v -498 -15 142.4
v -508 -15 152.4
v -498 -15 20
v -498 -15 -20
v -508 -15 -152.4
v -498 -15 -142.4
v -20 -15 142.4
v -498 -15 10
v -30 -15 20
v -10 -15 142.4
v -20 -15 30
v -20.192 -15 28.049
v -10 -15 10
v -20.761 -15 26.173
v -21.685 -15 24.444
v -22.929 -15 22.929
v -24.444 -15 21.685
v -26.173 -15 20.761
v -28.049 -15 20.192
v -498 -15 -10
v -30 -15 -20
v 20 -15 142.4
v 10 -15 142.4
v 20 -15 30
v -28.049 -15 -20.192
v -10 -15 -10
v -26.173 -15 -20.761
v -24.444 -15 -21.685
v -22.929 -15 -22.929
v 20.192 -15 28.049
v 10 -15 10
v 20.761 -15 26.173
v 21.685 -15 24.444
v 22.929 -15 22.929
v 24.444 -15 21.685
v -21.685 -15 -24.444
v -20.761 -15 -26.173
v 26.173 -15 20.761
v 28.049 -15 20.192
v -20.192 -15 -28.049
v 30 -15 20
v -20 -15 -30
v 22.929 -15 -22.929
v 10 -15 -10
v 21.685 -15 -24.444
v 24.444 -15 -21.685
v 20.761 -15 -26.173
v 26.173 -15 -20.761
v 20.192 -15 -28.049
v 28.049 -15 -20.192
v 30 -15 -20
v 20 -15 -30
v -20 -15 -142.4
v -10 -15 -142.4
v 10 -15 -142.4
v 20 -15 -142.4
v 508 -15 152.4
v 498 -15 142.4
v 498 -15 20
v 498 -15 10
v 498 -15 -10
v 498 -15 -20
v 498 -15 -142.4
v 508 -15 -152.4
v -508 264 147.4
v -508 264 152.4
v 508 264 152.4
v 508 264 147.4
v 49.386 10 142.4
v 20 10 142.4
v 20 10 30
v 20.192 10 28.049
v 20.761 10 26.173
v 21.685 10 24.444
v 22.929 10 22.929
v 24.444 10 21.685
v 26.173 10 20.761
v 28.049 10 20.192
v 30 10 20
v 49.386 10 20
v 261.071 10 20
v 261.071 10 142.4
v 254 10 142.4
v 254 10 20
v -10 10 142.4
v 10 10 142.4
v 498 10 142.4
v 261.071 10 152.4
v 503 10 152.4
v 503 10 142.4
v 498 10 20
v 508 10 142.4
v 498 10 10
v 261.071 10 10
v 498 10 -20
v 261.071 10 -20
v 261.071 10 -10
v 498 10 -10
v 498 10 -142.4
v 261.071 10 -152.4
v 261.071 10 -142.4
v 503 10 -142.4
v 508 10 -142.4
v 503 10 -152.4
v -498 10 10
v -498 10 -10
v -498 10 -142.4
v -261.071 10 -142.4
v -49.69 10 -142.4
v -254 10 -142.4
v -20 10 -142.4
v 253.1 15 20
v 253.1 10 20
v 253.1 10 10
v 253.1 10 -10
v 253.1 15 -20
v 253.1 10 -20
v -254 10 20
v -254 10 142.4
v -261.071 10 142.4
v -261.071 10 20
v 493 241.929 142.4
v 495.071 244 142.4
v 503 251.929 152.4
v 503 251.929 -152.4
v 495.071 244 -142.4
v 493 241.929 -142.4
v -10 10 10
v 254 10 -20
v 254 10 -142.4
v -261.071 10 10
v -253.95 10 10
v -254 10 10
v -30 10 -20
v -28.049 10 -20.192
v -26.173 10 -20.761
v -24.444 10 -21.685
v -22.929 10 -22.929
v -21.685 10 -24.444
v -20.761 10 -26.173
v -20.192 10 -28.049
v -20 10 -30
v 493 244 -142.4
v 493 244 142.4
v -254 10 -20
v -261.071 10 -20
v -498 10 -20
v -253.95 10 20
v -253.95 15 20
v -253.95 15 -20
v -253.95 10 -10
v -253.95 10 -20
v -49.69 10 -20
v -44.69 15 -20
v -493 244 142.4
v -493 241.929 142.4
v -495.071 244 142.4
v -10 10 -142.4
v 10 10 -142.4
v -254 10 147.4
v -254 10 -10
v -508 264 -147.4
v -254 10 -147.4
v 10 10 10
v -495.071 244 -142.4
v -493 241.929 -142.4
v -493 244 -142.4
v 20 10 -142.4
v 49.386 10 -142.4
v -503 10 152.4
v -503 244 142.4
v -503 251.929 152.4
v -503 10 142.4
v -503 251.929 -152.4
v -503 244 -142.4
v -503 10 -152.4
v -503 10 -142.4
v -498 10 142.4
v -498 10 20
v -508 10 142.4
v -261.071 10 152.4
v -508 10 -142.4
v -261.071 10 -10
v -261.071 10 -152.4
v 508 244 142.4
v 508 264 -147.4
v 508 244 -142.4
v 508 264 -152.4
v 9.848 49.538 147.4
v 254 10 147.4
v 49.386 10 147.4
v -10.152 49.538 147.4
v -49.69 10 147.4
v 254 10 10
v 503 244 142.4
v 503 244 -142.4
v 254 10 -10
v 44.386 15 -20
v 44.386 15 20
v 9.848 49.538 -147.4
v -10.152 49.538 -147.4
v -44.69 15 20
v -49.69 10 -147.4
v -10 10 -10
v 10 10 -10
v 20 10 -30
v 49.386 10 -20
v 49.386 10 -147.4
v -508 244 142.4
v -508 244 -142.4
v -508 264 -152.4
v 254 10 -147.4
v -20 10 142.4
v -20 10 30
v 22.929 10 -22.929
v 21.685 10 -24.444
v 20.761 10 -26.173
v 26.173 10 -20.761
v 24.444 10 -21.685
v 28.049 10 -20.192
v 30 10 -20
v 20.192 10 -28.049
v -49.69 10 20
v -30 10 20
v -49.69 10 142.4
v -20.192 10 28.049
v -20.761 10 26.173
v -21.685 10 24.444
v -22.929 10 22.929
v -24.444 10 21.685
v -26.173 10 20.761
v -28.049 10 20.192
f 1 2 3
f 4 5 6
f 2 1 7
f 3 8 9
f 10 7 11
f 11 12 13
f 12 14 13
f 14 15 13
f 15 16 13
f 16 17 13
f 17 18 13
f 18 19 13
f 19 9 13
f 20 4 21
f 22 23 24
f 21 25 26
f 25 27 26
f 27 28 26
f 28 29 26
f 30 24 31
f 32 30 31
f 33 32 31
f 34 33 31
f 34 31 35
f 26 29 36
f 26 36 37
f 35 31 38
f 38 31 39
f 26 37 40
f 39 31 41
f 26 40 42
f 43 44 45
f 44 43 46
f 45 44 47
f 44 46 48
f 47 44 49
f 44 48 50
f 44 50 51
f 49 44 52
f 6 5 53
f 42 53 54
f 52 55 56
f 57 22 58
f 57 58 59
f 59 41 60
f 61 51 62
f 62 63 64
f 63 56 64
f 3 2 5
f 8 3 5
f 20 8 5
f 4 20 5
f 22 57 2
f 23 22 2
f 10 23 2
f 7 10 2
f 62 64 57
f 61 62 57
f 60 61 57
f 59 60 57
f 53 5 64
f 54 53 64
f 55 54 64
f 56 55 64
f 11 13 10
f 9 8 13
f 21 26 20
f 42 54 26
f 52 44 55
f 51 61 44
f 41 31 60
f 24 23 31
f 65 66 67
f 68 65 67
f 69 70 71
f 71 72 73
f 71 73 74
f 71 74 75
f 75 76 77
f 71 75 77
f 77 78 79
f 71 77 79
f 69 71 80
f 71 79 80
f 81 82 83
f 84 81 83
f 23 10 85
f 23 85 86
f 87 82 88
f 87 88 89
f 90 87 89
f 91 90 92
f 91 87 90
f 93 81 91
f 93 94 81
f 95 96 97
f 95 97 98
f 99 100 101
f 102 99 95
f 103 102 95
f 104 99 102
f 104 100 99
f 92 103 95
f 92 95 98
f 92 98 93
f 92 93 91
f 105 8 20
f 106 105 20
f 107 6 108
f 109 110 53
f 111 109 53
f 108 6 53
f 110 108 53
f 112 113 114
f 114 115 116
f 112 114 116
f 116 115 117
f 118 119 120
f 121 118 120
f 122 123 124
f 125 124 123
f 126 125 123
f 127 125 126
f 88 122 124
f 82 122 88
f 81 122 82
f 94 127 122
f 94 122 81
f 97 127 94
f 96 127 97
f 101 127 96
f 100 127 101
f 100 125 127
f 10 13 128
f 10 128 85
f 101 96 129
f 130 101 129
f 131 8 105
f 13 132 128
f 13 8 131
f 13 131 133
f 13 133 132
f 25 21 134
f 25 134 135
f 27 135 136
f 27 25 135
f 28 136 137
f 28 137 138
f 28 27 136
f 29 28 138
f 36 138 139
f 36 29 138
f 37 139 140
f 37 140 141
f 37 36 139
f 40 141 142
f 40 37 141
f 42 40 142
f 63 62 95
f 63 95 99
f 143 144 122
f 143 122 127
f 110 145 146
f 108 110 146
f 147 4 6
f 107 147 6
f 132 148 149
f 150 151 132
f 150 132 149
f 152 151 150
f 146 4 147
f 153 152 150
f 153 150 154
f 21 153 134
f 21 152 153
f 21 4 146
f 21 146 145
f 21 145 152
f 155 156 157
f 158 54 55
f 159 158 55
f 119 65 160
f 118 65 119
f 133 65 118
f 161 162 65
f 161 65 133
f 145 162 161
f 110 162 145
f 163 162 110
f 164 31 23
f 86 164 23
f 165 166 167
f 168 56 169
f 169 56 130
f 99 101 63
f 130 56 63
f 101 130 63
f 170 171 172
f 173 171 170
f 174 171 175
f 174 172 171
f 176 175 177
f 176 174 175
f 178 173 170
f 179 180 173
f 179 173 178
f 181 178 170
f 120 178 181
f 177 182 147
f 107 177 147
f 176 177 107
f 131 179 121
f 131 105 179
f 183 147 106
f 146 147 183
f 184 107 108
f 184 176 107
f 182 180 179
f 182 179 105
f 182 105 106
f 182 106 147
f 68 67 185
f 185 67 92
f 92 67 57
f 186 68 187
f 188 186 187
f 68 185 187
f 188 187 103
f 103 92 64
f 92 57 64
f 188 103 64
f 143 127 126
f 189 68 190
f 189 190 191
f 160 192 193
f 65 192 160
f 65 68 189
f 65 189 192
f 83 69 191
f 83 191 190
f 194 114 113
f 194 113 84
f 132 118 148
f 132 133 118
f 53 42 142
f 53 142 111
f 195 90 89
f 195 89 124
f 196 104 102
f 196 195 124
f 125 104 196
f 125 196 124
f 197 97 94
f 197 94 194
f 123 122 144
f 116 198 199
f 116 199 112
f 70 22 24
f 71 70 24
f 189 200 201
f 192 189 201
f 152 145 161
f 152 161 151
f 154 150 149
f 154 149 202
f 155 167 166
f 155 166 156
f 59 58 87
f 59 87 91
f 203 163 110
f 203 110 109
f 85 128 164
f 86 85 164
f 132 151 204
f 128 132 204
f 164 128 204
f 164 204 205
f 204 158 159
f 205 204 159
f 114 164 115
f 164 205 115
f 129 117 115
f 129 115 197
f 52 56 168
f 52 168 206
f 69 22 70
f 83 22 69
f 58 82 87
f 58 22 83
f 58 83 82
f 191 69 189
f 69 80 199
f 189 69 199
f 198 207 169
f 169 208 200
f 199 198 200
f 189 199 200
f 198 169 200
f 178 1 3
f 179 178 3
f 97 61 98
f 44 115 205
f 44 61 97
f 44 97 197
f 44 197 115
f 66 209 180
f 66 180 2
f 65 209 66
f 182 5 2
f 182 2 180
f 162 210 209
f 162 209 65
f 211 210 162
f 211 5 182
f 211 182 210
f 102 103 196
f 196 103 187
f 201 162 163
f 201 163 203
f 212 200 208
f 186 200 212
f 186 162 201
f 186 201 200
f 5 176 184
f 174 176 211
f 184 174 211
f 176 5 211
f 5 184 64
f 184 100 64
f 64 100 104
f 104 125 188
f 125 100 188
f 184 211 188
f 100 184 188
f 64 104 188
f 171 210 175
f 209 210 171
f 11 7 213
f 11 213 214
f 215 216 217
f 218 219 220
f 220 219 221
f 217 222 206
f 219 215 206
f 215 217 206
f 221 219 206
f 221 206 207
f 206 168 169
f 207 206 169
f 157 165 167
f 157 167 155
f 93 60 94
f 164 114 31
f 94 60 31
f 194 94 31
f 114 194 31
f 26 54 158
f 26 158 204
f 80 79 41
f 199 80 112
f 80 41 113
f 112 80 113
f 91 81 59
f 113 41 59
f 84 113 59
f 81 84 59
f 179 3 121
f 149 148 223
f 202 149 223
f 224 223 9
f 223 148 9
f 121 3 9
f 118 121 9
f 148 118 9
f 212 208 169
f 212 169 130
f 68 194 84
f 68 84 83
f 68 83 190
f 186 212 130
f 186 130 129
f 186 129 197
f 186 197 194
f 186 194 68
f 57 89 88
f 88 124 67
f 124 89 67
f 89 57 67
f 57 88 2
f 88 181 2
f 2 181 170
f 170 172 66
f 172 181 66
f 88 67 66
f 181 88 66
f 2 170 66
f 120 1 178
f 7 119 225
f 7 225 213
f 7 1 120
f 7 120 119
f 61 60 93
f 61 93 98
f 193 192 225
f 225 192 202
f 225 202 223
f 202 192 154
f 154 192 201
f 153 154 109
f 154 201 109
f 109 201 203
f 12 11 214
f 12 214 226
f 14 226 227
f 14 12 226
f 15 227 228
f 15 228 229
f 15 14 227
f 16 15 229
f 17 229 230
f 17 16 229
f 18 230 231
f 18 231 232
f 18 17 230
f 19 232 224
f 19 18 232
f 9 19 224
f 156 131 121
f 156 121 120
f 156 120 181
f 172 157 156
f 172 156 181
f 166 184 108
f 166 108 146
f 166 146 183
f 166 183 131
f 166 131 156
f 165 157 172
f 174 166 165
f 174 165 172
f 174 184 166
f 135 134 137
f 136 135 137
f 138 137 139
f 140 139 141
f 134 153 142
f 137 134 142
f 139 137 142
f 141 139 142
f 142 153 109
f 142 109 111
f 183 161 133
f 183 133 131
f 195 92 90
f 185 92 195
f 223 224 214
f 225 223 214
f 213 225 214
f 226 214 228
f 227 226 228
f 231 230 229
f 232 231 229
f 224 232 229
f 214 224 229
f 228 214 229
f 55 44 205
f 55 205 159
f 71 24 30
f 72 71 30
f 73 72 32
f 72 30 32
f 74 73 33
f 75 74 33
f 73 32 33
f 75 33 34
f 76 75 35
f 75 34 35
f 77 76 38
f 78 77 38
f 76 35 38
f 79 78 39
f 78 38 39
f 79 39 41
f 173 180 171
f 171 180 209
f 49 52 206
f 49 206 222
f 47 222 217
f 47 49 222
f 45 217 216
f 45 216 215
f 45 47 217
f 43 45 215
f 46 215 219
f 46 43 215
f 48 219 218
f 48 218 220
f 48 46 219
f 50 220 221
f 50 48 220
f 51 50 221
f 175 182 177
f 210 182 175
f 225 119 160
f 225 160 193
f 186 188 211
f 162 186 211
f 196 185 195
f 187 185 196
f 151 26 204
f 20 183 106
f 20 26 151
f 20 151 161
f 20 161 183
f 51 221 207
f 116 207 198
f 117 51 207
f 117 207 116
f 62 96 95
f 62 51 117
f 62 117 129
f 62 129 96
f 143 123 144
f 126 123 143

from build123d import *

# Parameters (mm, degrees)
BOSS_EXTRUDE1_DEPTH      = 10
BOSS_EXTRUDE1_DEPTH_BACK = 15
SKETCH1_W                = 1016
SKETCH1_H                = 304.8
SKETCH1_W_2              = 996
SKETCH1_H_2              = 284.8
BOSS_EXTRUDE2_DEPTH      = 10
BOSS_EXTRUDE2_DEPTH_BACK = 15
BOSS_EXTRUDE3_DEPTH      = 152.4
BOSS_EXTRUDE3_DEPTH_BACK = 152.4
SKETCH4_W                = 507.049279033
SKETCH4_H                = 40
BOSS_EXTRUDE7_DEPTH      = 5
SKETCH5_W                = 284.8
SKETCH5_H                = 234
CUT_EXTRUDE1_DEPTH       = 15
SKETCH6_W                = 284.8
SKETCH6_H                = 234
CUT_EXTRUDE2_DEPTH       = 15
BOSS_EXTRUDE8_DEPTH      = 304.8
BOSS_EXTRUDE9_DEPTH      = 5
BOSS_EXTRUDE10_DEPTH     = 5


with BuildPart() as part:
    # Sketch1 → Boss-Extrude1 (new, two sides: drawn at the far end of the back side and taken through both)
    with BuildSketch(Plane(origin=(0, 0, 0), x_dir=(1, 0, 0), z_dir=(0, 1, 0)).offset(-BOSS_EXTRUDE1_DEPTH_BACK)):
        Rectangle(SKETCH1_W, SKETCH1_H)
        Rectangle(SKETCH1_W_2, SKETCH1_H_2, mode=Mode.SUBTRACT)
    extrude(amount=BOSS_EXTRUDE1_DEPTH + BOSS_EXTRUDE1_DEPTH_BACK)

    # Sketch2 → Boss-Extrude2 (add, two sides: drawn at the far end of the back side and taken through both)
    with BuildSketch(Plane(origin=(0, 0, 0), x_dir=(1, 0, 0), z_dir=(0, 1, 0)).offset(-BOSS_EXTRUDE2_DEPTH_BACK)):
        with BuildLine():
            Line((-498, 20), (-30, 20))
            ThreePointArc((-30, 20), (-22.928932188, 22.928932188), (-20, 30))
            Line((-20, 30), (-20, 142.4))
            Line((-20, 142.4), (-10, 142.4))
            Line((-10, 142.4), (-10, 20))
            Line((-10, 20), (-10, 10))
            Line((-10, 10), (-498, 10))
            Line((-498, 10), (-498, 20))
        make_face()
        with BuildLine():
            Line((498, 20), (498, 10))
            Line((498, 10), (10, 10))
            Line((10, 10), (10, 20))
            Line((10, 20), (10, 142.4))
            Line((10, 142.4), (20, 142.4))
            Line((20, 142.4), (20, 30))
            ThreePointArc((20, 30), (22.928932188, 22.928932188), (30, 20))
            Line((30, 20), (498, 20))
        make_face()
        with BuildLine():
            Line((-498, -10), (-10, -10))
            Line((-10, -10), (-10, -20))
            Line((-10, -20), (-10, -142.4))
            Line((-10, -142.4), (-20, -142.4))
            Line((-20, -142.4), (-20, -30))
            ThreePointArc((-20, -30), (-22.928932188, -22.928932188), (-30, -20))
            Line((-30, -20), (-498, -20))
            Line((-498, -20), (-498, -10))
        make_face()
        with BuildLine():
            Line((30, -20), (498, -20))
            Line((498, -20), (498, -10))
            Line((498, -10), (10, -10))
            Line((10, -10), (10, -20))
            Line((10, -20), (10, -142.4))
            Line((10, -142.4), (20, -142.4))
            Line((20, -142.4), (20, -30))
            ThreePointArc((20, -30), (22.928932188, -22.928932188), (30, -20))
        make_face()
    extrude(amount=BOSS_EXTRUDE2_DEPTH + BOSS_EXTRUDE2_DEPTH_BACK)

    # Sketch3 → Boss-Extrude3 (add, two sides: drawn at the far end of the back side and taken through both)
    with BuildSketch(Plane.XY.offset(-BOSS_EXTRUDE3_DEPTH_BACK)):
        Polygon((-508, 10), (-508, 264), (-254, 10), (-261.071067812, 10), (-503, 251.928932188), (-503, 10), align=None)
        Polygon((261.071067812, 10), (254, 10), (508, 264), (508, 10), (503, 10), (503, 251.928932188), align=None)
    extrude(amount=BOSS_EXTRUDE3_DEPTH + BOSS_EXTRUDE3_DEPTH_BACK)

    # Sketch4 → Boss-Extrude7 (add)
    with BuildSketch(Plane(origin=(0, 10, 0), x_dir=(1, 0, 0), z_dir=(0, 1, 0))):
        with Locations((-0.42499269, 0)):
            Rectangle(SKETCH4_W, SKETCH4_H)
    extrude(amount=BOSS_EXTRUDE7_DEPTH)

    # Sketch5 → Cut-Extrude1 (cut)
    with BuildSketch(Plane(origin=(508, 0, 0), x_dir=(0, 0, -1), z_dir=(1, 0, 0))):
        with Locations((0, 127)):
            Rectangle(SKETCH5_W, SKETCH5_H)
    extrude(amount=-CUT_EXTRUDE1_DEPTH, mode=Mode.SUBTRACT)

    # Sketch6 → Cut-Extrude2 (cut)
    with BuildSketch(Plane.ZY.offset(508)):
        with Locations((0, 127)):
            Rectangle(SKETCH6_W, SKETCH6_H)
    extrude(amount=-CUT_EXTRUDE2_DEPTH, mode=Mode.SUBTRACT)

    # Sketch7 → Boss-Extrude8 (add)
    with BuildSketch(Plane(origin=(0, 0, -152.4), x_dir=(-1, 0, 0), z_dir=(0, 0, -1))):
        Polygon((-49.38581657, 10), (-9.847908285, 49.537908285), (10.152091715, 49.537908285), (49.69, 10), align=None)
    extrude(amount=-BOSS_EXTRUDE8_DEPTH)

    # Sketch8 → Boss-Extrude9 (add)
    with BuildSketch(Plane.XY.offset(152.4)):
        Polygon((-508, 264), (508, 264), (254, 10), (-254, 10), align=None)
    extrude(amount=-BOSS_EXTRUDE9_DEPTH)

    # Sketch9 → Boss-Extrude10 (add)
    with BuildSketch(Plane(origin=(0, 0, -152.4), x_dir=(-1, 0, 0), z_dir=(0, 0, -1))):
        Polygon((-508, 264), (508, 264), (254, 10), (-254, 10), align=None)
    extrude(amount=-BOSS_EXTRUDE10_DEPTH)


solid = part.part
